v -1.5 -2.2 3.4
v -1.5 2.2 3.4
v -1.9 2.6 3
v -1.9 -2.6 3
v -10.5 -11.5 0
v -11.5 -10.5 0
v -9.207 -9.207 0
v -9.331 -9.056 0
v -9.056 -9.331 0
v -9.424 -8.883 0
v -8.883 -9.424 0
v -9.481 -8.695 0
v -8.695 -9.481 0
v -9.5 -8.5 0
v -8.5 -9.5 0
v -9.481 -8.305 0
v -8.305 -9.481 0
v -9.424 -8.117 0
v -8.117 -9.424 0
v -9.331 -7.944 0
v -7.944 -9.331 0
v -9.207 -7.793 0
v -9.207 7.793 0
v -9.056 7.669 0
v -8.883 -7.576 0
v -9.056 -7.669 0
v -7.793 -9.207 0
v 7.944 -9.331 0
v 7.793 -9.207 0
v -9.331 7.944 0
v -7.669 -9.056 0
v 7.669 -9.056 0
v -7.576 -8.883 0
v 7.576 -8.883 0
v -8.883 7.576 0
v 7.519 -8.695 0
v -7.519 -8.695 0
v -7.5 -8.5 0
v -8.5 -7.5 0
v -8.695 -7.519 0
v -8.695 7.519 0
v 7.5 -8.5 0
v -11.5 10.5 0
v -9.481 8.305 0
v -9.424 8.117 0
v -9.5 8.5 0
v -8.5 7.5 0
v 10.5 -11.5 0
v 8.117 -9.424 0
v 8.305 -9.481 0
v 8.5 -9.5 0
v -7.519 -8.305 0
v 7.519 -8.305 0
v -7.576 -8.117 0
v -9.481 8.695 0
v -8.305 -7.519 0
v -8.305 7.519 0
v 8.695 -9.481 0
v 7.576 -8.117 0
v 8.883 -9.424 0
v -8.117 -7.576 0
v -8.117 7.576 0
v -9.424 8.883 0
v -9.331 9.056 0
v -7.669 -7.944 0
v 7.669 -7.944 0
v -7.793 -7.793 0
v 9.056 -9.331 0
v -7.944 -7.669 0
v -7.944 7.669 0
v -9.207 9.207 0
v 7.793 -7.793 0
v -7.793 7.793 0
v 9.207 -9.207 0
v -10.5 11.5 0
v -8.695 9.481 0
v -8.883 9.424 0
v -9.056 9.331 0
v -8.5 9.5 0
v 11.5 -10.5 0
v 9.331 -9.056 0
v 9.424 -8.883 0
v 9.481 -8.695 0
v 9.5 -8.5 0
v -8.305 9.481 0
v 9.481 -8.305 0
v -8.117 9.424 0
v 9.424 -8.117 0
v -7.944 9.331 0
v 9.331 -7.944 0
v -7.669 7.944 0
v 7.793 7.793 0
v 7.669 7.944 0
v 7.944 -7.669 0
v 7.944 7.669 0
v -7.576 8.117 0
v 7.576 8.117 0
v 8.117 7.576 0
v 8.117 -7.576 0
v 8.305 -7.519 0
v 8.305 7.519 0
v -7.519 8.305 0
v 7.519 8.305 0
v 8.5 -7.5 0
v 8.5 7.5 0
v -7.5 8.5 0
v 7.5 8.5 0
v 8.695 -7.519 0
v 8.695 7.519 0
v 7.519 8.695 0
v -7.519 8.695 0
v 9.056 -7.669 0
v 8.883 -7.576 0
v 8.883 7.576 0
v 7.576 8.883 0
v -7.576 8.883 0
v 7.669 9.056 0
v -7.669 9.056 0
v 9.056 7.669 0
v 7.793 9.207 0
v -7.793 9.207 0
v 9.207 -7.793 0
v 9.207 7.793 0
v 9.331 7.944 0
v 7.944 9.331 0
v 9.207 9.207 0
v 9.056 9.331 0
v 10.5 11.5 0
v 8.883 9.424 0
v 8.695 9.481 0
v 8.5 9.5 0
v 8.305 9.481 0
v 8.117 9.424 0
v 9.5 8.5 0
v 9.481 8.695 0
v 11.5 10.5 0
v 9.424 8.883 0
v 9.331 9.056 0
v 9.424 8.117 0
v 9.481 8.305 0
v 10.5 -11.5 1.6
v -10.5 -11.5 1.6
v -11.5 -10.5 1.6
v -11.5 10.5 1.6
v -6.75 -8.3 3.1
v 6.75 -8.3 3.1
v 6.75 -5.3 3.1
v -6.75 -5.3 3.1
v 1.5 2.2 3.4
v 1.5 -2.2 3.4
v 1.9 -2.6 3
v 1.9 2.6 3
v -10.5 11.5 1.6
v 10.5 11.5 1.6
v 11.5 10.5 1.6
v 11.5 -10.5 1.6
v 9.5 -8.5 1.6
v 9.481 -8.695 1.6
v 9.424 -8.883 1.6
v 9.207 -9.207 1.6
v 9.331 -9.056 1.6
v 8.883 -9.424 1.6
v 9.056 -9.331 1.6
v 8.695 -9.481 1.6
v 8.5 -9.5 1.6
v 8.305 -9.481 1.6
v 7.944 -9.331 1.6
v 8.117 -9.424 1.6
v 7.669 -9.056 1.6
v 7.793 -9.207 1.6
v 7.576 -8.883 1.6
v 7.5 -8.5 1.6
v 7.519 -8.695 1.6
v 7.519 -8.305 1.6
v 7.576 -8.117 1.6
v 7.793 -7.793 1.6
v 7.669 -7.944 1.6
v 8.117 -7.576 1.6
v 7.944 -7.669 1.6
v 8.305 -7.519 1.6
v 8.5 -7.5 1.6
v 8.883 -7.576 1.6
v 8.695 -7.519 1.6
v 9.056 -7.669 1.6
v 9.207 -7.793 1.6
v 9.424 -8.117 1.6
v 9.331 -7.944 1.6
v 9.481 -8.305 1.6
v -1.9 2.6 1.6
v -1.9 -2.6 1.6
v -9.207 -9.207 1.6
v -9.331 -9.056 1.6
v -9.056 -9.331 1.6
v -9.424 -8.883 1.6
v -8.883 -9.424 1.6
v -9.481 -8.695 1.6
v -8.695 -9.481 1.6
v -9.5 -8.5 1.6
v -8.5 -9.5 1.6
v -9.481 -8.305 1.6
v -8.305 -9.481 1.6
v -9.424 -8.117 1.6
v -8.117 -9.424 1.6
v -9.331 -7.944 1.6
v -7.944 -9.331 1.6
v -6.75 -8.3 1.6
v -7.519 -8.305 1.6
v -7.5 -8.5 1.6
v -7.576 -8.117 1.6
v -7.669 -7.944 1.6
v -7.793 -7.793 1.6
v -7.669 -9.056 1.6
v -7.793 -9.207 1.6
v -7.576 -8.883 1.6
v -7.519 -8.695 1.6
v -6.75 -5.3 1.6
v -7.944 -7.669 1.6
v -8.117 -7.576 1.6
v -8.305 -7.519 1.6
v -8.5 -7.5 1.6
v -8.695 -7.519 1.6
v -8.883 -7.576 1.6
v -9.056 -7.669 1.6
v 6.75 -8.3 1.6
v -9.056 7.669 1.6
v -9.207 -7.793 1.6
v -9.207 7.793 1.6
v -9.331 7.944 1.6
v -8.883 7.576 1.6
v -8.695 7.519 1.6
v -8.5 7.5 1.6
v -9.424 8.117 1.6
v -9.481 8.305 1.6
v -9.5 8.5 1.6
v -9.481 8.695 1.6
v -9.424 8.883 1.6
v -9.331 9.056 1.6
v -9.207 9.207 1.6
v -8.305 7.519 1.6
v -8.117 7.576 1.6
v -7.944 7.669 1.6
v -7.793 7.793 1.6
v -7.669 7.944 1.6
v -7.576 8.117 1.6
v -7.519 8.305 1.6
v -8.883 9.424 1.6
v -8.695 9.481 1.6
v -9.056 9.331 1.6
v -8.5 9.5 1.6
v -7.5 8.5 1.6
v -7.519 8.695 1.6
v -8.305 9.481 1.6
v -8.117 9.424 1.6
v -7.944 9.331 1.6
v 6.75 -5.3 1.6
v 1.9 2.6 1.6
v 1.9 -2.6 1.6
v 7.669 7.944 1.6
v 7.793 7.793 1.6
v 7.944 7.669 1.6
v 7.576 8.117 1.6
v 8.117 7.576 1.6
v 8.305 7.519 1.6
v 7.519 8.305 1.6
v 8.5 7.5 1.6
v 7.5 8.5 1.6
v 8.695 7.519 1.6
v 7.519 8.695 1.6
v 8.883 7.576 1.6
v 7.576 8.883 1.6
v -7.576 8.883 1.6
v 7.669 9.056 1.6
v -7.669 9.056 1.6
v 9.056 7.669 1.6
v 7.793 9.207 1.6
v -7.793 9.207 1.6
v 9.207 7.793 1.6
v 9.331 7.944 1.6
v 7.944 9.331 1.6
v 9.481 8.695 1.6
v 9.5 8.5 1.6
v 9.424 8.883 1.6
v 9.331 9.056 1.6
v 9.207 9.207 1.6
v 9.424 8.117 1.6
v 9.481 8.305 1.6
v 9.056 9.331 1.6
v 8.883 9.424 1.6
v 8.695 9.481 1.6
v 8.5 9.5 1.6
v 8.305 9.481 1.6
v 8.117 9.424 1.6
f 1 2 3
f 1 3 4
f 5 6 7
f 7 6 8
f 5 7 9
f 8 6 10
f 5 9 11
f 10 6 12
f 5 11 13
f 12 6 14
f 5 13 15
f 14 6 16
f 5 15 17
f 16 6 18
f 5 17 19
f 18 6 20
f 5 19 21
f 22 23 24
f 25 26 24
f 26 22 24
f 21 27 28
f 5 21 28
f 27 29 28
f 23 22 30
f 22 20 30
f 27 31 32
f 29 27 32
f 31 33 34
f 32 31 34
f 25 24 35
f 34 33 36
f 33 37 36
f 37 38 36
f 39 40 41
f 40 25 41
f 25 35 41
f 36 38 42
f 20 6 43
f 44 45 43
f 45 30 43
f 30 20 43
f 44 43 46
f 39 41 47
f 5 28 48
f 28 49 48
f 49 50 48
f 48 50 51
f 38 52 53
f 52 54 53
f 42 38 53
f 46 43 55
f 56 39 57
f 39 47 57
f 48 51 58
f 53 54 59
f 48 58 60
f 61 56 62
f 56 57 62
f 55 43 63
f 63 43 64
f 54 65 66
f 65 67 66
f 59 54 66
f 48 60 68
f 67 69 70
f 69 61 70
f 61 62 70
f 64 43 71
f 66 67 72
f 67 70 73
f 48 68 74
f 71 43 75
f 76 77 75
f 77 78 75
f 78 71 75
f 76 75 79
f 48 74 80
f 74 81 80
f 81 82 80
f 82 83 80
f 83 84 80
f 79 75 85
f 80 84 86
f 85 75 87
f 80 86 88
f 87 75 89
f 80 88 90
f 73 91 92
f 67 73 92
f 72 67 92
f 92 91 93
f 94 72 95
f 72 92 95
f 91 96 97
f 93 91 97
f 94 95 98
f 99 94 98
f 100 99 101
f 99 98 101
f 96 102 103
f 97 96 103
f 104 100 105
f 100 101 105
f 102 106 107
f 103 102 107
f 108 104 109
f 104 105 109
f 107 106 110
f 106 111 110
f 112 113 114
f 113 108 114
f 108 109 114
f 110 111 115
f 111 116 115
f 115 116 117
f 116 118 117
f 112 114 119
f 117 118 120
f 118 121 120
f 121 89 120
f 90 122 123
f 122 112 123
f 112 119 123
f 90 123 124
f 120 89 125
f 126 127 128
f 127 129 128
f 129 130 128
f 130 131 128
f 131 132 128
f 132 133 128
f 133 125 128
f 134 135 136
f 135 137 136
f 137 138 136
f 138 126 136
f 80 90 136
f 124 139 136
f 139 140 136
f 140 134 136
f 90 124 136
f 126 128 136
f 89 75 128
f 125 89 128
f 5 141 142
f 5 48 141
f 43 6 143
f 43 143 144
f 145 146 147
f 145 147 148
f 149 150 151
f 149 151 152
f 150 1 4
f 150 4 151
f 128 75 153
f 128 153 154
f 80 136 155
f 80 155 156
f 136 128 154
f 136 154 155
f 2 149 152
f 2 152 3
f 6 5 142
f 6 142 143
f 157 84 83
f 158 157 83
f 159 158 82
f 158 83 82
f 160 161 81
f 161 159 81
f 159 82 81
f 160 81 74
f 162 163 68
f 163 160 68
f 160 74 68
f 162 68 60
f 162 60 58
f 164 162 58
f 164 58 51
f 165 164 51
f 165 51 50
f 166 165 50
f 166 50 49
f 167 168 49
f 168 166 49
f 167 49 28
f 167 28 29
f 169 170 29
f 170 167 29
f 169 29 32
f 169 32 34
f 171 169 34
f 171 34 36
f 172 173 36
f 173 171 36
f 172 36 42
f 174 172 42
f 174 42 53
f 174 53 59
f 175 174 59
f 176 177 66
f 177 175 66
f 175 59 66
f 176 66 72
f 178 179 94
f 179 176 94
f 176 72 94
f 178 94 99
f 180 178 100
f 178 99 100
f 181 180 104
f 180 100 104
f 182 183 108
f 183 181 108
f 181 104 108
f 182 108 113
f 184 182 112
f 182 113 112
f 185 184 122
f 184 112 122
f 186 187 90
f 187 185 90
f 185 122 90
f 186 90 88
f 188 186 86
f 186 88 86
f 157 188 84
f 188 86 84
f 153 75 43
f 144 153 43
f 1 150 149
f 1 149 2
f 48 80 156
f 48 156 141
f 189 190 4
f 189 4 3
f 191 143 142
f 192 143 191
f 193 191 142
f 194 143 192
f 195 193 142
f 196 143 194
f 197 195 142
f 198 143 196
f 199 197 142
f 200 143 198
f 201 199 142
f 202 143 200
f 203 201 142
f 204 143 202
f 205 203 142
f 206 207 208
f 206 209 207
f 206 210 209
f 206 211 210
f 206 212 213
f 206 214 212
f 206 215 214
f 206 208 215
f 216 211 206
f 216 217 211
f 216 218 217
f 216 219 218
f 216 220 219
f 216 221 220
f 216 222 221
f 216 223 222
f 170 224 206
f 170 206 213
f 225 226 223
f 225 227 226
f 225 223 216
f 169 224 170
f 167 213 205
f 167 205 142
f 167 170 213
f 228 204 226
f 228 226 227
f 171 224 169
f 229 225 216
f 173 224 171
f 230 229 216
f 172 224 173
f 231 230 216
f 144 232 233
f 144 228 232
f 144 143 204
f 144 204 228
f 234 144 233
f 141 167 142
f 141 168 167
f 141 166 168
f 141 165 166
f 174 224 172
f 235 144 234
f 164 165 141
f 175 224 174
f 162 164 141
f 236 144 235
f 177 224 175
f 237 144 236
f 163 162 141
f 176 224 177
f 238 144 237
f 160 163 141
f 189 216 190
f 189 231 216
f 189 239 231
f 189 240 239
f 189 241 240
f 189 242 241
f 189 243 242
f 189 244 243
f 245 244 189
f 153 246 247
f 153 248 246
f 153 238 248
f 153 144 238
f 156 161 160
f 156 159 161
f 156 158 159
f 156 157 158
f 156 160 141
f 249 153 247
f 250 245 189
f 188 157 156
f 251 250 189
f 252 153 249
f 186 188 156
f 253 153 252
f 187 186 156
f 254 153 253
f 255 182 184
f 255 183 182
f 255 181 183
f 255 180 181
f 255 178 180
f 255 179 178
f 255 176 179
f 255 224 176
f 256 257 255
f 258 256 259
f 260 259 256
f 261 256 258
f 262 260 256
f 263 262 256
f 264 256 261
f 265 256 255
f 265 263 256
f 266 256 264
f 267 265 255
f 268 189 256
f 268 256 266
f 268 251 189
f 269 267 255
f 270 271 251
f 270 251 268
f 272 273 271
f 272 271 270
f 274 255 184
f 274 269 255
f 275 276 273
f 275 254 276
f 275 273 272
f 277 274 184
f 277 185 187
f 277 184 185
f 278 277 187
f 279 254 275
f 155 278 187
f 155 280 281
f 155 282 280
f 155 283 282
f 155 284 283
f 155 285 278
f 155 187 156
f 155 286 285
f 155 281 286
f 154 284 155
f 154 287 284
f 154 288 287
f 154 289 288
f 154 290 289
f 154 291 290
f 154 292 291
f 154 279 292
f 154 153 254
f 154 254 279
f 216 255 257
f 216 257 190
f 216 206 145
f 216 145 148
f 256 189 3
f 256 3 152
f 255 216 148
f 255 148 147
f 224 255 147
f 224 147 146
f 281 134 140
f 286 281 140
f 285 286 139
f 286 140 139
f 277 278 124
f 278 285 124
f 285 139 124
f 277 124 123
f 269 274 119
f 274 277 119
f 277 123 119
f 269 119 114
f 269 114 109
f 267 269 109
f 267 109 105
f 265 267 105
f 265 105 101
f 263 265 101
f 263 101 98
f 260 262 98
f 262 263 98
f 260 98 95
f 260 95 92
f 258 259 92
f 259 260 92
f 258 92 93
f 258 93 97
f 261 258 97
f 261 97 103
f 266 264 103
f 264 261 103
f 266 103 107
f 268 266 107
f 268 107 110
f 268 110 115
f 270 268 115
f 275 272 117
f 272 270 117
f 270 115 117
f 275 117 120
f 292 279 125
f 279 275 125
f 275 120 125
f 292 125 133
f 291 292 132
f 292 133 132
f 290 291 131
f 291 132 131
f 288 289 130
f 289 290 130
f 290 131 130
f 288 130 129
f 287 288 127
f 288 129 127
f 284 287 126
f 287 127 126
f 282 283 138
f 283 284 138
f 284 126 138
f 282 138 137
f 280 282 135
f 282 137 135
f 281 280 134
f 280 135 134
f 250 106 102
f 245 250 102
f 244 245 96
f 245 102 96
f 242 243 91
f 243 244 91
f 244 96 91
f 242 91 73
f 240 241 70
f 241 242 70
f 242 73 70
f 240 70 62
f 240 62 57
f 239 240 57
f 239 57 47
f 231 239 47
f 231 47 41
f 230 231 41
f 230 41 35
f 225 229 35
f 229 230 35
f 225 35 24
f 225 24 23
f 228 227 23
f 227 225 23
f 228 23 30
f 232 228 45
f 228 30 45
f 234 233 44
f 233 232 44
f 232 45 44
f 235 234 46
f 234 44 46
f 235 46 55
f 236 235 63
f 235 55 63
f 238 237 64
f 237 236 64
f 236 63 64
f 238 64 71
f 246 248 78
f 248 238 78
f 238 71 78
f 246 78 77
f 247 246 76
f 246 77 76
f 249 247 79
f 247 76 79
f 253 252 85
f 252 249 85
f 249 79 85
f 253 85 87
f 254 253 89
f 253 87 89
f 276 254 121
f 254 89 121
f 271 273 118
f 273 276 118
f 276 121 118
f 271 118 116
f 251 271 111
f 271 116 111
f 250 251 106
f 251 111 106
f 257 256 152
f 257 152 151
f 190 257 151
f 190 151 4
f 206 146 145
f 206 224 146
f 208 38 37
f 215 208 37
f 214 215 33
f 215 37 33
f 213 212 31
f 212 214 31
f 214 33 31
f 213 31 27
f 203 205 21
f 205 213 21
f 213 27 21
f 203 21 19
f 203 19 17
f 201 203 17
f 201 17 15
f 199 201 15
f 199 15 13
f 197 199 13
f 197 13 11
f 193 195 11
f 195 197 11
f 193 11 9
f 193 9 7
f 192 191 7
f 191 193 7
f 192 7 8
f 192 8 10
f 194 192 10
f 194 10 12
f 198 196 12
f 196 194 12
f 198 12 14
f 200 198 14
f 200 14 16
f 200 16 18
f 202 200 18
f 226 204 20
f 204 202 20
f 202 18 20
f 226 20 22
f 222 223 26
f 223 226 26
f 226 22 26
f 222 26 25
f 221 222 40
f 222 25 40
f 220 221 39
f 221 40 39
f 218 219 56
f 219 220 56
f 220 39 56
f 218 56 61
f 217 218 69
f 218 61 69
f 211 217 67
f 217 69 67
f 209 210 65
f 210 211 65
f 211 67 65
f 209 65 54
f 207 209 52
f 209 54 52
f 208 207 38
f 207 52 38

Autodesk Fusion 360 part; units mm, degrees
sketch "Sketch1" plane through (0, 0, 0) normal (0, 0, 1) x (1, 0, 0)
  circle A0 centre (-8.5, 8.5) radius 1
  line L0 (-10.5, 11.5) -> (10.5, 11.5)
  line L1 (11.5, 10.5) -> (11.5, -10.5)
  line L2 (10.5, -11.5) -> (-10.5, -11.5)
  line L3 (-11.5, -10.5) -> (-11.5, 10.5)
  line L4 (-9.5, 11.5) -> (-9.5, 8.5) construction
  line L5 (-7.5, 11.5) -> (-7.5, 8.5) construction
  line L6 (-8.5, 9.5) -> (-11.5, 9.5) construction
  line L7 (0, 11.5) -> (0, -11.5) construction
  line L8 (-11.5, 0) -> (11.5, 0) construction
  circle A1 centre (8.5, 8.5) radius 1
  circle A2 centre (8.5, -8.5) radius 1
  circle A3 centre (-8.5, -8.5) radius 1
  line L9 (-10.5, 11.5) -> (-11.5, 10.5)
  line L10 (10.5, 11.5) -> (11.5, 10.5)
  line L11 (11.5, -10.5) -> (10.5, -11.5)
  line L12 (-10.5, -11.5) -> (-11.5, -10.5)
  point P0 (-11.5, 11.5)
  point P1 (11.5, 11.5)
  point P2 (11.5, -11.5)
  point P3 (-11.5, -11.5)
  dimension "d2" = 23
  dimension "d3" = 23
  dimension "d5" = 2
  dimension "d6" = 19
  dimension "d7" = 2
  dimension "d8" = 1
  dimension "d9" = 1
  dimension "d10" = 1
  dimension "d11" = 1
  dimension "d12" = 1
  dimension "d13" = 1
  dimension "d14" = 1
  dimension "d15" = 1
extrude "Extrude1" add sketch "Sketch1" along normal blind 1.6
sketch "Sketch2" plane through (0, 0, 1.6) normal (0, 0, 1) x (-1, 0, 0)
  circle A0 centre (8.5, 8.5) radius 1
  circle A1 centre (-8.5, -8.5) radius 1
  circle A2 centre (-8.5, 8.5) radius 1
  circle A3 centre (8.5, -8.5) radius 1
  line L0 (10.5, -11.5) -> (11.5, -10.5)
  line L1 (11.5, -10.5) -> (11.5, 10.5)
  line L2 (11.5, 10.5) -> (10.5, 11.5)
  line L3 (10.5, 11.5) -> (-10.5, 11.5)
  line L4 (-10.5, 11.5) -> (-11.5, 10.5)
  line L5 (-11.5, 10.5) -> (-11.5, -10.5)
  line L6 (-11.5, -10.5) -> (-10.5, -11.5)
  line L7 (-10.5, -11.5) -> (10.5, -11.5)
  line L8 (1.9, -2.6) -> (-1.9, -2.6)
  line L9 (-1.9, -2.6) -> (-1.9, 2.6)
  line L10 (-1.9, 2.6) -> (1.9, 2.6)
  line L11 (1.9, 2.6) -> (1.9, -2.6)
  line L12 (11, -11) -> (-11, 11) construction
  line L13 (-11, -11) -> (11, 11) construction
  line L14 (1.9, -2.6) -> (-1.9, 2.6) construction
  line L15 (1.9, 2.6) -> (-1.9, -2.6) construction
  line L16 (6.75, 6.8) -> (-6.75, 6.8)
  line L17 (6.75, 5.3) -> (-6.75, 5.3)
  line L18 (-6.75, 5.3) -> (-6.75, 8.3)
  line L19 (-6.75, 8.3) -> (6.75, 8.3)
  line L20 (6.75, 8.3) -> (6.75, 5.3)
  line L21 (0, 6.8) -> (0, 11.5) construction
  dimension "d18" = 5.2
  dimension "d19" = 3.8
  dimension "d23" = 4.7
  dimension "d24" = 3
  dimension "d25" = 13.5
extrude "Extrude2" add sketch "Sketch2" along normal blind 1.8 contours L8 L9 L10 L11
chamfer "Chamfer1" distance 0.4 angle 45 1 faces at (-0.6333, 0.8667, 3.4)
extrude "Extrude3" add sketch "Sketch2" along normal blind 1.5 contours L16 L17 L18 L20 | L16 L18 L19 L20
sketch "Sketch3" plane through (0, 0, 3.4) normal (0, 0, 1) x (-1, 0, 0)
  line L0 (-1.5, -2.2) -> (1.5, -2.2)
  line L1 (1.5, -2.2) -> (1.5, 2.2)
  line L2 (1.5, 2.2) -> (-1.5, 2.2)
  line L3 (-1.5, 2.2) -> (-1.5, -2.2)
equation "d7 = d5"
equation "d9 = d8"
equation "d11 = d10"
equation "d13 = d12"
equation "d15 = d14"
